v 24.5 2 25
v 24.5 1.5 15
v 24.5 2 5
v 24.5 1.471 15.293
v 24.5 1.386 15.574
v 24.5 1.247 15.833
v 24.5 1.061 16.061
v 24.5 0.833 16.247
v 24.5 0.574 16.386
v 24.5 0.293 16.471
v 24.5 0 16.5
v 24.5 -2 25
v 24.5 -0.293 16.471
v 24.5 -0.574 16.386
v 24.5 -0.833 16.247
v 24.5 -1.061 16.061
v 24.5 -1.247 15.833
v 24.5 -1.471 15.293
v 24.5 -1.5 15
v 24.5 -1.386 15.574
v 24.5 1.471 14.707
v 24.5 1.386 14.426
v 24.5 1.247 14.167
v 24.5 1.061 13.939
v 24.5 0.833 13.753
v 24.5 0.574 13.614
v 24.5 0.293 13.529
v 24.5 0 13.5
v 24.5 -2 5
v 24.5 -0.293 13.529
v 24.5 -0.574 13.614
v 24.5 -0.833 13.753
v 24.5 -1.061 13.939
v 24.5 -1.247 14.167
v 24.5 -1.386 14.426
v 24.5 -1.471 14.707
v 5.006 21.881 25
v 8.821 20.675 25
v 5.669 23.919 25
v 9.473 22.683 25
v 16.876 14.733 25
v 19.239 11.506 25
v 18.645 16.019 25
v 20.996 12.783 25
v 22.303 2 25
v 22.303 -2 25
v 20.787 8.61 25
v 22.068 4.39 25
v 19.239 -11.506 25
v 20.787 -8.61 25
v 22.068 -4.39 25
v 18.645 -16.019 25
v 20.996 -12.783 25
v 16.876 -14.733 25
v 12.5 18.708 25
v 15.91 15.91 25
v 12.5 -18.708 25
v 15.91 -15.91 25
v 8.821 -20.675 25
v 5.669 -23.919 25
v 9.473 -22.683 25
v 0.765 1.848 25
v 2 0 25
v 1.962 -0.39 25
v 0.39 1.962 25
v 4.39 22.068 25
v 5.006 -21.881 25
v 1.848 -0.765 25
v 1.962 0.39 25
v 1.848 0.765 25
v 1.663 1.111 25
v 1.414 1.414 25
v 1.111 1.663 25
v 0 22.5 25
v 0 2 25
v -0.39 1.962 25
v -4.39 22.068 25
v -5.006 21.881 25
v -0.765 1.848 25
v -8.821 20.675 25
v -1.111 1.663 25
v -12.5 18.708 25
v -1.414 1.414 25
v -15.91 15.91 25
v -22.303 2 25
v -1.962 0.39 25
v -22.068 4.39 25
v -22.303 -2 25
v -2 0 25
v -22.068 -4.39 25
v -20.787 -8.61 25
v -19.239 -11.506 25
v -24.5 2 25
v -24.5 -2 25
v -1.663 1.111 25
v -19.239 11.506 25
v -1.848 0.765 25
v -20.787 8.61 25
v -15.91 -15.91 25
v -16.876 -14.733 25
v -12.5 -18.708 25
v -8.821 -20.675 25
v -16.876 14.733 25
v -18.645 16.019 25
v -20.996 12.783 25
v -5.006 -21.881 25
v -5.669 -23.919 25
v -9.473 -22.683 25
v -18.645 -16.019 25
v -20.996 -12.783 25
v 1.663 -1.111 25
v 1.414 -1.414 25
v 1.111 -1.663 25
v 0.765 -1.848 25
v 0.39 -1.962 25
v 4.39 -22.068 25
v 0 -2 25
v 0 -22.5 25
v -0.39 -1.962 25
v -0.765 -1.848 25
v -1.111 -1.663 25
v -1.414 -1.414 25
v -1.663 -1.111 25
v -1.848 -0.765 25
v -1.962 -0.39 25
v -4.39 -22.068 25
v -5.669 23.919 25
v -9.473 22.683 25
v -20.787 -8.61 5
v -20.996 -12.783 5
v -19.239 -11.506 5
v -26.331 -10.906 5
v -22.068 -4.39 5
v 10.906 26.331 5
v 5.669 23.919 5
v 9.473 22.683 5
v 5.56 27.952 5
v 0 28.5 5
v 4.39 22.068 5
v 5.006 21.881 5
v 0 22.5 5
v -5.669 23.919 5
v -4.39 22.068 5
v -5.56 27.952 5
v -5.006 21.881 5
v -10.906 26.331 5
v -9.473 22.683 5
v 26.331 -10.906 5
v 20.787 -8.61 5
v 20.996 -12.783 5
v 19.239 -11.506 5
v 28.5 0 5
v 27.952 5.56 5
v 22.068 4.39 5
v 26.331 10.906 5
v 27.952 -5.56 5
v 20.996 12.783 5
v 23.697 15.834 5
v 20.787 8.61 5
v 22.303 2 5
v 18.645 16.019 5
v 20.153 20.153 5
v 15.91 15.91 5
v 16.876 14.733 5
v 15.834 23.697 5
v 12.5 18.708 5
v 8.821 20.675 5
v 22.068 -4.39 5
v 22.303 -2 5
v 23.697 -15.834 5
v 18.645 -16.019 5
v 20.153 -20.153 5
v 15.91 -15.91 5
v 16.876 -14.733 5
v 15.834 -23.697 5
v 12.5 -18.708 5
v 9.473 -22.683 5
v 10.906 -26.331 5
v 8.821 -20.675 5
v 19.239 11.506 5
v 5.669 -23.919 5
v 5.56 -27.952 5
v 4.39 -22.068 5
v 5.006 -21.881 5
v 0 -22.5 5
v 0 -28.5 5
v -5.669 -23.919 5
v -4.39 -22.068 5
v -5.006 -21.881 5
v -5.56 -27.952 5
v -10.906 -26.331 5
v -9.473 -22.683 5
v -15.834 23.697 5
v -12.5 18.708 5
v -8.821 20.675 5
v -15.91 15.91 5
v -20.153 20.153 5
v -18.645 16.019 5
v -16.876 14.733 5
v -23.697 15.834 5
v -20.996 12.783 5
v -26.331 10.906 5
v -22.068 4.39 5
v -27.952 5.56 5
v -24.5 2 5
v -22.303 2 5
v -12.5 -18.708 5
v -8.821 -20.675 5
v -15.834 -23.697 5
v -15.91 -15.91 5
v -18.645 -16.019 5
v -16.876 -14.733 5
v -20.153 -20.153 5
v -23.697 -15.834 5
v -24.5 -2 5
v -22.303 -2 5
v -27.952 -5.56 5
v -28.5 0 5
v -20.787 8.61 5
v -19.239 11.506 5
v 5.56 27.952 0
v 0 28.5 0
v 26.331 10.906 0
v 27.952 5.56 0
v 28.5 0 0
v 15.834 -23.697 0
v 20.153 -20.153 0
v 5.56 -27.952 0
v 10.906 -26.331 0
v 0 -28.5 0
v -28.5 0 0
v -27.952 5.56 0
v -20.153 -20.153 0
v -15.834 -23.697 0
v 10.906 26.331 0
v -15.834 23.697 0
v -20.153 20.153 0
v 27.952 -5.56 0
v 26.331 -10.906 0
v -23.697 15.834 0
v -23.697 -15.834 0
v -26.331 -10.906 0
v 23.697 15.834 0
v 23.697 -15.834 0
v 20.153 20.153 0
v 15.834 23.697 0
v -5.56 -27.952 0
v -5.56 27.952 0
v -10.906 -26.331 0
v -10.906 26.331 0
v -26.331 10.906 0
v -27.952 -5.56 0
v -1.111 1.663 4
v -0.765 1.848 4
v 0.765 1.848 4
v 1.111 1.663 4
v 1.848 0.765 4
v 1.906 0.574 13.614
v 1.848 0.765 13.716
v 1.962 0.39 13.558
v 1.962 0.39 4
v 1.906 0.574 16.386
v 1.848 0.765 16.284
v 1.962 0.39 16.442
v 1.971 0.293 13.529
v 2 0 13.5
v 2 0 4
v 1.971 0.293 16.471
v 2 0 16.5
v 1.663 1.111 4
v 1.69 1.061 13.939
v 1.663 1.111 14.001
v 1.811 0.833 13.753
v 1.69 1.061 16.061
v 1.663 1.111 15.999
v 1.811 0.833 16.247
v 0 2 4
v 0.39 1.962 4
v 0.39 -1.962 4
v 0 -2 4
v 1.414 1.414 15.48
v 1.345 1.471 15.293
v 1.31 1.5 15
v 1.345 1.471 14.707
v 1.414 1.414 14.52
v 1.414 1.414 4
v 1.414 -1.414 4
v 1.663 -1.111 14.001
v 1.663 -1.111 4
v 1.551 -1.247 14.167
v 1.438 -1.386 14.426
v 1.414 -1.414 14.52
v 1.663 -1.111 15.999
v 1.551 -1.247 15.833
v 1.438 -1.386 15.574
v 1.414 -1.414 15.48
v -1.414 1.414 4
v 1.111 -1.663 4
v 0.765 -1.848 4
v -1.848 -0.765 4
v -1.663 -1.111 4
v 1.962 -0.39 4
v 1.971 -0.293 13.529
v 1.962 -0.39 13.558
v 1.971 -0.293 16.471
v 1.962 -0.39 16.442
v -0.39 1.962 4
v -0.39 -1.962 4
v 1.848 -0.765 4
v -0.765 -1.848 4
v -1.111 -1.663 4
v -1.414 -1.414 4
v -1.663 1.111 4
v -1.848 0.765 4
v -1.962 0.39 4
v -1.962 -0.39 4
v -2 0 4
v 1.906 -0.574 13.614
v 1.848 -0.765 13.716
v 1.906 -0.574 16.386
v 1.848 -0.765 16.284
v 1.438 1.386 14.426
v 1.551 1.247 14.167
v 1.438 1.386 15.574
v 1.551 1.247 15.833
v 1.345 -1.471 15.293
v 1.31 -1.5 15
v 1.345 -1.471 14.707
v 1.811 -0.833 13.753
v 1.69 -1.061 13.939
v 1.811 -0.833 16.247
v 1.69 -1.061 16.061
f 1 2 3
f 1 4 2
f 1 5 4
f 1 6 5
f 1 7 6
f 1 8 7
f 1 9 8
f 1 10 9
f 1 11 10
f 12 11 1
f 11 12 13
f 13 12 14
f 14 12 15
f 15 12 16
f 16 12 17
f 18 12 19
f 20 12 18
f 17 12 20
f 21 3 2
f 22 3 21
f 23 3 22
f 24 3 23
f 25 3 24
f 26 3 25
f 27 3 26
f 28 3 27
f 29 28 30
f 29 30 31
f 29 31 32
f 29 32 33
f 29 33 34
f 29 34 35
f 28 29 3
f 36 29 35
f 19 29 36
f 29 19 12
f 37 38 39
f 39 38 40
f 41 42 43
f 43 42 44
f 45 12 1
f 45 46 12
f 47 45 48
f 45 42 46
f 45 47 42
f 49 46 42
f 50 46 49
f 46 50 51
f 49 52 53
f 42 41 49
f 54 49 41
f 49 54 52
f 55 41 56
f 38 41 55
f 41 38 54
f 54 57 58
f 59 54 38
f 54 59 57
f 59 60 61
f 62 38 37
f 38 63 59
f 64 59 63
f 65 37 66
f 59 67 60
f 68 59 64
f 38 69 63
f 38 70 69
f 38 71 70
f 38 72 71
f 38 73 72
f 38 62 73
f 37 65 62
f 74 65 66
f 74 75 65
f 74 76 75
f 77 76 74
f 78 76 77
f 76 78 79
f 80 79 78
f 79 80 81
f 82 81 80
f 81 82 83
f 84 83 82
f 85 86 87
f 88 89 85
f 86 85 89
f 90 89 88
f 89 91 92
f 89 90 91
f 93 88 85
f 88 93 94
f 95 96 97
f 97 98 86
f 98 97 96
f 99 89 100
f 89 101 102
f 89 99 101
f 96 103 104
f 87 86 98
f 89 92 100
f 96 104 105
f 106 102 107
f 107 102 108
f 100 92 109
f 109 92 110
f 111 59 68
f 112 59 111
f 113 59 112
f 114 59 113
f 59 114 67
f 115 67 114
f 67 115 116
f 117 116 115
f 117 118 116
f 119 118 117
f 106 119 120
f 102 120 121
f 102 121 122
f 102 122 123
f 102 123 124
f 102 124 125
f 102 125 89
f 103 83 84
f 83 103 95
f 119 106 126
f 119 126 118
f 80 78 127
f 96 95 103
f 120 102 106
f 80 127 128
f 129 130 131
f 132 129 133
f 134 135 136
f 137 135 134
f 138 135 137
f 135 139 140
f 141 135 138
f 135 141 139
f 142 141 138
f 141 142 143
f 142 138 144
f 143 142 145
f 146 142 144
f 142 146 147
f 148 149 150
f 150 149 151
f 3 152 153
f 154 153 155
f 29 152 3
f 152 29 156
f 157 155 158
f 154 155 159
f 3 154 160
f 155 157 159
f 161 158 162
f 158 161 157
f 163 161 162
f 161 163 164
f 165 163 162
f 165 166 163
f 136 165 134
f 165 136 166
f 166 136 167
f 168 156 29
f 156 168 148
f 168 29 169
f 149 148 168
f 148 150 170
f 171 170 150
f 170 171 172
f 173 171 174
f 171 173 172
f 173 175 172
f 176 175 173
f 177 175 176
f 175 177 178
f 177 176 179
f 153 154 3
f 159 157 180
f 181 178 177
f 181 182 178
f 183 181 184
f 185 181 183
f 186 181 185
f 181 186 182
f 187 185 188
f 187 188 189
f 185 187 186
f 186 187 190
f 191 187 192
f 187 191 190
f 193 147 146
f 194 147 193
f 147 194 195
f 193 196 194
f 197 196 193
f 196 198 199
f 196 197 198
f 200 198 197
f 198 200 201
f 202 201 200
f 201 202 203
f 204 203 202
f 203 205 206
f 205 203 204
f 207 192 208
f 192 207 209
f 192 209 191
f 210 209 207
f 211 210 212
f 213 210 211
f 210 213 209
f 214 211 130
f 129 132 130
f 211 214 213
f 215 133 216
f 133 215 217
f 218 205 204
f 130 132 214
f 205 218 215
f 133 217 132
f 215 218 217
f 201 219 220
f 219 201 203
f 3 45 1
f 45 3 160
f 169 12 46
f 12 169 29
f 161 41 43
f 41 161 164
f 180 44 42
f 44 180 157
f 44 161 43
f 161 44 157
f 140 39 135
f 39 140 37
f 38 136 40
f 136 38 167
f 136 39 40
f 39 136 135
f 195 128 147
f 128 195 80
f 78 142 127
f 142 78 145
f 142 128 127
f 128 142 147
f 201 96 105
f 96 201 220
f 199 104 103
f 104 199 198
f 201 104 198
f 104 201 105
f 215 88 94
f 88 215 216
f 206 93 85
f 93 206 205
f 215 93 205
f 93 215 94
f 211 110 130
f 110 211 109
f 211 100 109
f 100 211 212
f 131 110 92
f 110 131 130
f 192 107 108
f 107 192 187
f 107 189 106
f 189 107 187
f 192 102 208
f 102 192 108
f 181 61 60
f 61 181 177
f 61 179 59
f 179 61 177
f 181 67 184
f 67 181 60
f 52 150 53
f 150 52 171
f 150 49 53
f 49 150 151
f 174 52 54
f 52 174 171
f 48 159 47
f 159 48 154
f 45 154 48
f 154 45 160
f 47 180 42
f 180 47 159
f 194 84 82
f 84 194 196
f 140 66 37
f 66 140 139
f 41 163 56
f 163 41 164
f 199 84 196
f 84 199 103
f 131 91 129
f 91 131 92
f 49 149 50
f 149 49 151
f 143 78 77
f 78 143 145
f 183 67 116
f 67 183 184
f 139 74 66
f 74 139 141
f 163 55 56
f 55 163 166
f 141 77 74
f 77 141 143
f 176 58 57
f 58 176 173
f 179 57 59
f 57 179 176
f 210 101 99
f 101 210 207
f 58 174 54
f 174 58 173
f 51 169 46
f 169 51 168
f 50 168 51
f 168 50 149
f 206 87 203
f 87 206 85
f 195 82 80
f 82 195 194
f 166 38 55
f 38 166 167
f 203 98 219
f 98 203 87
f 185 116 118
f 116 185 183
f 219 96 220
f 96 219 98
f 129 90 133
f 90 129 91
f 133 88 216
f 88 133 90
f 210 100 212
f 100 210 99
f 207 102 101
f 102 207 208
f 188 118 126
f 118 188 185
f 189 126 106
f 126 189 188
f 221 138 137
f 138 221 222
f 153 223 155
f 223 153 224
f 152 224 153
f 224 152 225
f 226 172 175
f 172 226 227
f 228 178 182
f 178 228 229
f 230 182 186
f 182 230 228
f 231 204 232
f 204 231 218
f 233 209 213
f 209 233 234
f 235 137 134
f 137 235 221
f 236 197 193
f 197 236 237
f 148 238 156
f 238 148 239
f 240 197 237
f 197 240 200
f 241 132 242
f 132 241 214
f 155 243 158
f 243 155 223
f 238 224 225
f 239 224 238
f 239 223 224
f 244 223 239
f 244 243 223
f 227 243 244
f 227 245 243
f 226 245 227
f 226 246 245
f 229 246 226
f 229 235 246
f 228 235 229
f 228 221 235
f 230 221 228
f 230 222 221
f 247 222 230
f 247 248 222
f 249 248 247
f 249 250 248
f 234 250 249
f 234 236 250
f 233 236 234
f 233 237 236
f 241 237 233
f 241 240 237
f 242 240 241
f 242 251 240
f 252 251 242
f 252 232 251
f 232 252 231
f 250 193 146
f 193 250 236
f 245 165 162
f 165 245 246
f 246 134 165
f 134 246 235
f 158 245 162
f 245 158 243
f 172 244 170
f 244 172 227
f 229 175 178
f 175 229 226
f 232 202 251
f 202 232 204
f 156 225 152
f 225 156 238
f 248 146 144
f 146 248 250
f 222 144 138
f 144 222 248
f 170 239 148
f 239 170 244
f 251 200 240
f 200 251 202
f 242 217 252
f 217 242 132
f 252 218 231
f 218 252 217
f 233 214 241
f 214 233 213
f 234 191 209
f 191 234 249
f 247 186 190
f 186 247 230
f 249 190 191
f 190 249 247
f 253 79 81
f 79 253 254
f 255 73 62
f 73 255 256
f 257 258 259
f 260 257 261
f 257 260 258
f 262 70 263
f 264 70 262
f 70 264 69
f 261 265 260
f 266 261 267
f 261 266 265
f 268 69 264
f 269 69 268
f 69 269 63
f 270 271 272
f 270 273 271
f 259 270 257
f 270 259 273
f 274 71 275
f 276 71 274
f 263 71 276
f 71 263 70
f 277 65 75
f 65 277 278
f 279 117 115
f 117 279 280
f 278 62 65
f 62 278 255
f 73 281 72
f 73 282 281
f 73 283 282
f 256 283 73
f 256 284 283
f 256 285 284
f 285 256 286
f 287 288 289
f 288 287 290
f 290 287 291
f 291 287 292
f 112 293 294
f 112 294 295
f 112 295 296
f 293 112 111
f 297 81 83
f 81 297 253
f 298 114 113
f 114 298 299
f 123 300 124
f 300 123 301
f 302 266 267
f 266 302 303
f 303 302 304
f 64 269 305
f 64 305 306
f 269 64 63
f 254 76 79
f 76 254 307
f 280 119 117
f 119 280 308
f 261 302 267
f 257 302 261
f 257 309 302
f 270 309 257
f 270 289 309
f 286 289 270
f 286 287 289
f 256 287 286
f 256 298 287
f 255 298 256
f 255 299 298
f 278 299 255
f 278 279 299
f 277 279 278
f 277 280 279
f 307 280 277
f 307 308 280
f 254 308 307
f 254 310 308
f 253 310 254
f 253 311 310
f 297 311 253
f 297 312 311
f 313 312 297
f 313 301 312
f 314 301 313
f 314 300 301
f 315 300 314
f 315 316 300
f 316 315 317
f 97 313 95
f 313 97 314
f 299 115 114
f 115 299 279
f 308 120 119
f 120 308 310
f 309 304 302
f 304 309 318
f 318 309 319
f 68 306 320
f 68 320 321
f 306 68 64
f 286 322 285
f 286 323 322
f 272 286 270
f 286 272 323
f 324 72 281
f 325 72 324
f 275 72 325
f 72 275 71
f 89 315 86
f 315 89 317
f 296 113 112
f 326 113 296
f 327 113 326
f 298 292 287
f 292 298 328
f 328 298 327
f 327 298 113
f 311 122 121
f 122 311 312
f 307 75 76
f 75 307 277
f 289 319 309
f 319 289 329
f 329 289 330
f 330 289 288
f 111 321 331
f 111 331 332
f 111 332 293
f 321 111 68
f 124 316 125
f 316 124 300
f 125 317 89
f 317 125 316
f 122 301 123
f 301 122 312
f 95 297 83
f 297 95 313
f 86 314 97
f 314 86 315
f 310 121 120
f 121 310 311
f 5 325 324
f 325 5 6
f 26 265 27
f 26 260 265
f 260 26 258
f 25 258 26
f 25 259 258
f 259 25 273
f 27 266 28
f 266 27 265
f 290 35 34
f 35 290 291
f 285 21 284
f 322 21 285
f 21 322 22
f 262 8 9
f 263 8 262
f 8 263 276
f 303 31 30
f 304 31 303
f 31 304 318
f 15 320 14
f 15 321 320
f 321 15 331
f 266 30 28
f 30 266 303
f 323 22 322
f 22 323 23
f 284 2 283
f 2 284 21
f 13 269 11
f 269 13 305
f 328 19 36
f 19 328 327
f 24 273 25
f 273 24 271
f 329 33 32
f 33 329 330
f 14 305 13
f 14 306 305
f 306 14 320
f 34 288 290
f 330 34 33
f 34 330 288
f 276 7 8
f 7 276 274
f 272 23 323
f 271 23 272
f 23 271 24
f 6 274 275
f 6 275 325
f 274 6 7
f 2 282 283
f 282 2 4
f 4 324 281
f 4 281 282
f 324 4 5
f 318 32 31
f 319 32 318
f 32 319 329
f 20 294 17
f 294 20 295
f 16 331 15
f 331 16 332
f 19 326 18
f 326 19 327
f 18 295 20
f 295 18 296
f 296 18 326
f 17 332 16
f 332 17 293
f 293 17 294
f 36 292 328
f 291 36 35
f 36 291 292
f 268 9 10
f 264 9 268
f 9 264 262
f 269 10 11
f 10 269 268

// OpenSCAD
$fn = 32;

// ----------------------------------------------------------------------
// Control knob: skirt knob with grip ribs
// ----------------------------------------------------------------------

// --- parameters (mm) ---
skirt_d = 57;             // skirt diameter
skirt_t = 5;              // skirt thickness
rib_w = 4;                // grip rib width
rib_out = 3;              // grip rib radial protrusion
n_ribs = 10;              // number of grip ribs
knob_d = 45;              // knob body diameter
knob_h = 20;              // knob body height
bore_d = 4;               // shaft bore diameter
set_d = 3;                // set screw bore diameter

rib_step = 360 / n_ribs;  // rib angular step
total_h = skirt_t + knob_h;  // overall height

difference() {
  union() {
    translate([0, 0, skirt_t]) cylinder(h = knob_h, d = knob_d);
    cylinder(h = skirt_t, d = skirt_d);
    for (i = [0 : n_ribs - 1])
      rotate([0, 0, i * rib_step])
        translate([knob_d / 2 - 1, -rib_w / 2, skirt_t])
          cube([rib_out, rib_w, knob_h]);
  }
  translate([0, 0, skirt_t - 1]) cylinder(h = knob_h + 2, d = bore_d);
  translate([-1, 0, skirt_t + knob_h / 2]) rotate([0, 90, 0])
    cylinder(h = knob_d / 2 + bore_d / 2 + 2, d = set_d);
}
